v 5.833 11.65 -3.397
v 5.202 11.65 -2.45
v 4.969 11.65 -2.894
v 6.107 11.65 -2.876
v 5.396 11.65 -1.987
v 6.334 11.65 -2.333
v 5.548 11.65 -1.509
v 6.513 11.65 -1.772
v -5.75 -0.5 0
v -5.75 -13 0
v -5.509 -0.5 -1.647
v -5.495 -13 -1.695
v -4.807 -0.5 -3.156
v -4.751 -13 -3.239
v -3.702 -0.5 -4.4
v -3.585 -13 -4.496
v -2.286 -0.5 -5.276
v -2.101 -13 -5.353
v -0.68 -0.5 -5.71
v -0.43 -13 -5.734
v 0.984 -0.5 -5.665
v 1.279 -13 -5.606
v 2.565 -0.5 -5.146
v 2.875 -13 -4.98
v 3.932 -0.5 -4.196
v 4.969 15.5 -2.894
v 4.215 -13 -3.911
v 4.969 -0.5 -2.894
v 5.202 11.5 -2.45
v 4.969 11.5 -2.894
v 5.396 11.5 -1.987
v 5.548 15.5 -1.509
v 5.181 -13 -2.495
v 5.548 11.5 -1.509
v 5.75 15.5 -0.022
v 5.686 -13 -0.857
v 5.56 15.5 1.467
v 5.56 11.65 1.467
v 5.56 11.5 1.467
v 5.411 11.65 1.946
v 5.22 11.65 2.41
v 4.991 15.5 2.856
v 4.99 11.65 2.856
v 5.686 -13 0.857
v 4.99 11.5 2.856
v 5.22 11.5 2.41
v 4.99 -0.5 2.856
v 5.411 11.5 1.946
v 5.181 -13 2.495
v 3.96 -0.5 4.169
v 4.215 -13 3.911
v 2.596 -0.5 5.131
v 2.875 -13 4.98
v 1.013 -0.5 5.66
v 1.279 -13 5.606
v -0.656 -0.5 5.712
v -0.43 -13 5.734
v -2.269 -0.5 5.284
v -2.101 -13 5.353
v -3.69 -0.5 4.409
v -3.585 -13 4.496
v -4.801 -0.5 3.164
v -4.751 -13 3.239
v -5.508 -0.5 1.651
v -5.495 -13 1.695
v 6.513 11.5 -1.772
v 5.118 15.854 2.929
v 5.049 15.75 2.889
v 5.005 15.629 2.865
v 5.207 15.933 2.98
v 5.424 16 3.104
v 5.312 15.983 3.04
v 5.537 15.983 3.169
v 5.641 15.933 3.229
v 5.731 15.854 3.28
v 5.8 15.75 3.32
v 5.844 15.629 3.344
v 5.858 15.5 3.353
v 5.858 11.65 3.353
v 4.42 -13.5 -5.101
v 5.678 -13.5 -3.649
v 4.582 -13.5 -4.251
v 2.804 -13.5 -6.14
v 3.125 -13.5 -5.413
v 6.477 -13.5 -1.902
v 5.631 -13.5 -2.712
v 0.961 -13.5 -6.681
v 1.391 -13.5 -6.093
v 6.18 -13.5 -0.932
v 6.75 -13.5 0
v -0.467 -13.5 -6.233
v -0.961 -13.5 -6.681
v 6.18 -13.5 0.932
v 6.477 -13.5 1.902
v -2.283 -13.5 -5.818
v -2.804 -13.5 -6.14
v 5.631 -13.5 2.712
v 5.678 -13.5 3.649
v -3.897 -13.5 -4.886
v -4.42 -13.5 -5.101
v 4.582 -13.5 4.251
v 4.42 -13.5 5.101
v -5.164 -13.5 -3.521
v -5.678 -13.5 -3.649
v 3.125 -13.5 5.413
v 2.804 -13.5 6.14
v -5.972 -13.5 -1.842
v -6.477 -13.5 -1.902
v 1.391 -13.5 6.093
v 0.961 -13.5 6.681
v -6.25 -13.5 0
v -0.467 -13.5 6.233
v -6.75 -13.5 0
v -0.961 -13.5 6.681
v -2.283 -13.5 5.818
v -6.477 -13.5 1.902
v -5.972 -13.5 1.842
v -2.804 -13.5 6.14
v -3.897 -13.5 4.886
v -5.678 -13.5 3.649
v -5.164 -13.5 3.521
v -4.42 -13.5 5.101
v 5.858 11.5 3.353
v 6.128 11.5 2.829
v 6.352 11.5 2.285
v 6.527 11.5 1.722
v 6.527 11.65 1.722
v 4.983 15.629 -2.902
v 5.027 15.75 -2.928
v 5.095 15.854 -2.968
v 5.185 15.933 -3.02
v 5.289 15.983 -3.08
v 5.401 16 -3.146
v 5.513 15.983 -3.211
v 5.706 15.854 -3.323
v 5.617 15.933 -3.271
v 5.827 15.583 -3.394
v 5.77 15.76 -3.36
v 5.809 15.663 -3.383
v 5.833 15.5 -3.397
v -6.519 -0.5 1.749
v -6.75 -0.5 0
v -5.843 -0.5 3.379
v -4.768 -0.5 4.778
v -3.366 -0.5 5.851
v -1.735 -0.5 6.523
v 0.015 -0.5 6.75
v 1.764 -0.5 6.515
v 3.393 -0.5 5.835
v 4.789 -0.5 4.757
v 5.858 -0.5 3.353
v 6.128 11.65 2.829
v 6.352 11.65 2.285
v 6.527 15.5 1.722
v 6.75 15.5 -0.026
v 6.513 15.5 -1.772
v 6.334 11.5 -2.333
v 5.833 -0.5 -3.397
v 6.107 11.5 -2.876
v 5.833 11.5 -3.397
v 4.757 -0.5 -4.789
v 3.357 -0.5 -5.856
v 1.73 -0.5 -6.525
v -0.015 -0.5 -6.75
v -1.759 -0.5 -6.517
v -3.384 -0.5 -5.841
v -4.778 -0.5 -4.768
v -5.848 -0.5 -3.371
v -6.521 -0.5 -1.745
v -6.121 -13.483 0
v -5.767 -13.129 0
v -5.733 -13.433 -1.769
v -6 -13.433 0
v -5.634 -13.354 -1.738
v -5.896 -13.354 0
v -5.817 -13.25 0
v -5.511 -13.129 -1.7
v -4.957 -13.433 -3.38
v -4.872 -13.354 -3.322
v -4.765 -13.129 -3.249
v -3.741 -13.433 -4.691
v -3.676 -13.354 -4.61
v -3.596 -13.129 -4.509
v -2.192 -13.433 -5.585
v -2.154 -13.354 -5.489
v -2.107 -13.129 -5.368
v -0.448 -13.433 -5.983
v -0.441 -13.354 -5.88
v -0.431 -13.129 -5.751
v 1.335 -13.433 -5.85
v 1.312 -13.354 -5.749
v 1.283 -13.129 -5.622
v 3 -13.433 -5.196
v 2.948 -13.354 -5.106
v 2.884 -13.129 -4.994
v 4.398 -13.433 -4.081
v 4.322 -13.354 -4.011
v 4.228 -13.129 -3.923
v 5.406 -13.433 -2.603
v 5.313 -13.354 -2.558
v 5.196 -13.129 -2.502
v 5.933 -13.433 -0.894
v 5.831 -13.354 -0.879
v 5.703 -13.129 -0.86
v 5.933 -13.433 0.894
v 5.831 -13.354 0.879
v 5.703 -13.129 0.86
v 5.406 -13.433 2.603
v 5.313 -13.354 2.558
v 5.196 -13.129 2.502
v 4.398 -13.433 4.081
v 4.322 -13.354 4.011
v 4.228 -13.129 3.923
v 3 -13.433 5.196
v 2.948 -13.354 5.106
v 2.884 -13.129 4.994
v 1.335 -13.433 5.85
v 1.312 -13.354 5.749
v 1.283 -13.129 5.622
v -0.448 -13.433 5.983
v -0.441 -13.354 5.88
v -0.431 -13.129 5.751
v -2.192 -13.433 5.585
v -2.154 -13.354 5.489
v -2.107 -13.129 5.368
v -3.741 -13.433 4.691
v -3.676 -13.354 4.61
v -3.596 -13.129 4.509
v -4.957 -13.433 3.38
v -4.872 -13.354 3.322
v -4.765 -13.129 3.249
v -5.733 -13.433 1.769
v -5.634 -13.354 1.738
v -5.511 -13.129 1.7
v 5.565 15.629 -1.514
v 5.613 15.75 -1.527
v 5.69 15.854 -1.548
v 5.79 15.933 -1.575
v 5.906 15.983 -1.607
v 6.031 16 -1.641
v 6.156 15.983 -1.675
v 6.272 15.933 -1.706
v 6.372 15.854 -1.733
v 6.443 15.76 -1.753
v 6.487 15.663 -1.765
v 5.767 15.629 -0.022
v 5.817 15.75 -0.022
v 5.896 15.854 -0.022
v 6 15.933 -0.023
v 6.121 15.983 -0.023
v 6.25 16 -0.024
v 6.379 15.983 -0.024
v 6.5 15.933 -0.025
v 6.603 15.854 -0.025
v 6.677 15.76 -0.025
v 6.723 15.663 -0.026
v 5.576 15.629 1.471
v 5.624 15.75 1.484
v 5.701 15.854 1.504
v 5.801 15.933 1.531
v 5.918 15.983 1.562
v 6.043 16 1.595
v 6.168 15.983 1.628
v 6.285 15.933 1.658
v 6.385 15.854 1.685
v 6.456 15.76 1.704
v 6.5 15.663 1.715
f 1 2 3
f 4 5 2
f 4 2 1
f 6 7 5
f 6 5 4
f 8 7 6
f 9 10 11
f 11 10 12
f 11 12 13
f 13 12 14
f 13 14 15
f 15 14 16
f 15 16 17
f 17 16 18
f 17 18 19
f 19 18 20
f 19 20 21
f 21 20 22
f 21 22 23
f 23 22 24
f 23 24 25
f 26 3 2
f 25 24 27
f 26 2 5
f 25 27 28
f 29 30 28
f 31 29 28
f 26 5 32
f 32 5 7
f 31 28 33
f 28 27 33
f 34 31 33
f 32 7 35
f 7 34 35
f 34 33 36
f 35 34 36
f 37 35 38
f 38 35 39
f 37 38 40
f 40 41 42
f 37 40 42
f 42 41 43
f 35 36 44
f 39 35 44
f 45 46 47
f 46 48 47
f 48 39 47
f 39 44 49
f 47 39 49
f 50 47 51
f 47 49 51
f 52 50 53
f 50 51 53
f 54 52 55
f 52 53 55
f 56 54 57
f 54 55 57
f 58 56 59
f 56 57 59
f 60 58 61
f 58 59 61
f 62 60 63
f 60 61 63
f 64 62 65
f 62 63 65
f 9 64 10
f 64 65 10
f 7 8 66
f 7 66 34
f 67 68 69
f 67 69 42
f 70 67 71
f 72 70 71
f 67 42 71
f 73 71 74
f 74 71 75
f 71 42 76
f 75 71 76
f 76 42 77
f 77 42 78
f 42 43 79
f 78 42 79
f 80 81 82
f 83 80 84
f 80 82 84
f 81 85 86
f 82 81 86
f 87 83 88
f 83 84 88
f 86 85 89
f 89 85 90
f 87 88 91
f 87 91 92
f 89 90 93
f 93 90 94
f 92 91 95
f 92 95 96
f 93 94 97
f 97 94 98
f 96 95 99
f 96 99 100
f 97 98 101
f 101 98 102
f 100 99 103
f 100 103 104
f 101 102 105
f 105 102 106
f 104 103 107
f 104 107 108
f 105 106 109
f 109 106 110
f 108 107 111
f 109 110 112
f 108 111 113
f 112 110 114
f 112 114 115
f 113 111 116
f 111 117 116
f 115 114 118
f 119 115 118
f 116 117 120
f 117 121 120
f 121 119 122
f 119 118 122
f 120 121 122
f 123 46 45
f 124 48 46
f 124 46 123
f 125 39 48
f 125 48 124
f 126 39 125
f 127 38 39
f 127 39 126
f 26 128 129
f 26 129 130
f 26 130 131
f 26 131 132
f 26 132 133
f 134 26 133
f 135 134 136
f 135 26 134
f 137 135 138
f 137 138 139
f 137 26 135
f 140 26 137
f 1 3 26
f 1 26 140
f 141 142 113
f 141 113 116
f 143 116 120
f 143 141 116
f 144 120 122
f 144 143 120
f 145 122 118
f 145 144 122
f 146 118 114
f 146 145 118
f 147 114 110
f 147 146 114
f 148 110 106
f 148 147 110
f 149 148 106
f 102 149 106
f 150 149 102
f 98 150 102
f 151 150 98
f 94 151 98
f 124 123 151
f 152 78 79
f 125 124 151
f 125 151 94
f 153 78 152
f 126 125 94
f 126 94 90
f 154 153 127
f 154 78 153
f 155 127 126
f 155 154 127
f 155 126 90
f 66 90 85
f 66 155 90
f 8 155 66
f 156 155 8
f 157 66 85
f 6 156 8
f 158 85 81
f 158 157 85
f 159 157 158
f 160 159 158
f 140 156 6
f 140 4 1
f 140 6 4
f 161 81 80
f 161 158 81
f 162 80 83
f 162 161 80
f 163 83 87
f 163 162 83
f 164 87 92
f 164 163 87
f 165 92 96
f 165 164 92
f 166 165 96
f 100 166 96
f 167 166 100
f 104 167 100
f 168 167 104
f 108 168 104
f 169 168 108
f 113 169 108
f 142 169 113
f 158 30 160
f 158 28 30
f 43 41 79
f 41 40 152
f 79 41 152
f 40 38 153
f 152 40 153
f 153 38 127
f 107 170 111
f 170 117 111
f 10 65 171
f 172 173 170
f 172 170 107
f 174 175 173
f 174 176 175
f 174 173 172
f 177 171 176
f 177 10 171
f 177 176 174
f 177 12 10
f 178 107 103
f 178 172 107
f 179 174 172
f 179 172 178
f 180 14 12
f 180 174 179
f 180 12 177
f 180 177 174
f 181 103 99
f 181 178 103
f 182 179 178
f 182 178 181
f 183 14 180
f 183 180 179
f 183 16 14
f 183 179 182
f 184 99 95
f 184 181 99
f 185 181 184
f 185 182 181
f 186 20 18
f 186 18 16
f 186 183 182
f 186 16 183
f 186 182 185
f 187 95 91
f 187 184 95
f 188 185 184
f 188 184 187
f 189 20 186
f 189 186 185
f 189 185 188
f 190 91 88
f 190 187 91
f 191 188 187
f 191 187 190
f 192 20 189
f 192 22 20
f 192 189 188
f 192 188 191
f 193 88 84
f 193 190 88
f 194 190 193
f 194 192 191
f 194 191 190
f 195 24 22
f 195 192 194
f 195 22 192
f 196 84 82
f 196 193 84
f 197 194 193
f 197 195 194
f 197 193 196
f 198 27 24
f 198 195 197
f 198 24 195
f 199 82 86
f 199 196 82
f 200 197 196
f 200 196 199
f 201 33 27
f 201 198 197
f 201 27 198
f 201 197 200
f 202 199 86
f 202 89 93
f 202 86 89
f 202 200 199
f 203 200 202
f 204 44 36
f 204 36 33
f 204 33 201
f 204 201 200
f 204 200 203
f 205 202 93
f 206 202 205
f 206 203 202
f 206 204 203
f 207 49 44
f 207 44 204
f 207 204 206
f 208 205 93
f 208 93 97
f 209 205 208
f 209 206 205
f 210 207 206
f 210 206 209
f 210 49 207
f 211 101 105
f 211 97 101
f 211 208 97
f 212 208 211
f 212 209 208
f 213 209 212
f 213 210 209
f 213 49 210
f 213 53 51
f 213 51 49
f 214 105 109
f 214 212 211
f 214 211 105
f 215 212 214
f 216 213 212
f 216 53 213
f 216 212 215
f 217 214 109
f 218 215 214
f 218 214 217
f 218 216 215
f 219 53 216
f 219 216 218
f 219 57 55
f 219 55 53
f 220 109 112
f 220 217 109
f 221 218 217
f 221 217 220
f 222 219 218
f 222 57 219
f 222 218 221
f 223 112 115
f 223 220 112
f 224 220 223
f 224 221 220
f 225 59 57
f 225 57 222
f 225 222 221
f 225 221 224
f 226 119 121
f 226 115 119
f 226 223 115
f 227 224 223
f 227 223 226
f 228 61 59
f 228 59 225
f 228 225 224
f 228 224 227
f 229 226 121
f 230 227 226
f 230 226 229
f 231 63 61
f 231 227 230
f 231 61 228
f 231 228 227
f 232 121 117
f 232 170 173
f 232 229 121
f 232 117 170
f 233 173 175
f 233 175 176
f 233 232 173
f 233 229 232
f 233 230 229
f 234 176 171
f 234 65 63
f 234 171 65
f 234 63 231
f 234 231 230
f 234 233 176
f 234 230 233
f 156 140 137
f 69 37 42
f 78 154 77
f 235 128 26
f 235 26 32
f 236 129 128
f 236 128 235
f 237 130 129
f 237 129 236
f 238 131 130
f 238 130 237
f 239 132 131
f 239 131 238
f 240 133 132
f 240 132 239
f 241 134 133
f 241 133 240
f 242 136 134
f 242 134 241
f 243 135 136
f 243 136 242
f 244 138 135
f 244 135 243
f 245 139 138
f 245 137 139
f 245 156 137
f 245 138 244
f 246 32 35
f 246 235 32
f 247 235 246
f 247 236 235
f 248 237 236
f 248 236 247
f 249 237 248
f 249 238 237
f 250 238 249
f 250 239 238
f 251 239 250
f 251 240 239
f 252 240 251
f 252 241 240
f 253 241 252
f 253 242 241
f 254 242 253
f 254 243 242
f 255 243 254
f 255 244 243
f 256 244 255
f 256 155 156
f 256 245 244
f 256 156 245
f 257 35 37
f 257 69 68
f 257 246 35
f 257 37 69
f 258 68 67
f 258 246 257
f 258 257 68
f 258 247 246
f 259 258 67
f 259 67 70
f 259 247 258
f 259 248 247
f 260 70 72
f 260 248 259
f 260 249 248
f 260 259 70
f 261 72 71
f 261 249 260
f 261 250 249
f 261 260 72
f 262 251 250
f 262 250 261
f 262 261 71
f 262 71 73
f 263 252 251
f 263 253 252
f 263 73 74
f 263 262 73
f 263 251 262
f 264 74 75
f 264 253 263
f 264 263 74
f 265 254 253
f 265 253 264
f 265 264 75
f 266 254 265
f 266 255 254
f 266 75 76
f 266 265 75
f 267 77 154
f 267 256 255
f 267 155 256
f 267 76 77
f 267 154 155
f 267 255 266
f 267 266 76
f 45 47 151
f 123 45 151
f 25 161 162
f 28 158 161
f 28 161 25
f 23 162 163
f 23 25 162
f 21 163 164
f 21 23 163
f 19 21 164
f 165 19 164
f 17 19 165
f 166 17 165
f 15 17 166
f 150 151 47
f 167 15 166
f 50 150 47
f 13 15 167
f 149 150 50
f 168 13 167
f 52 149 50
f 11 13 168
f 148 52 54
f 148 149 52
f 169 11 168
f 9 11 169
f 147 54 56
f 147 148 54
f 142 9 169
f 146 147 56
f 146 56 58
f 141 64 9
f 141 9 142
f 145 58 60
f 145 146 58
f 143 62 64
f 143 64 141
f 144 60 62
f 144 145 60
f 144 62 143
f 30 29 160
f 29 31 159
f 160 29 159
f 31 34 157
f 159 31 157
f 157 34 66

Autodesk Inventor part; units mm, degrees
sketch "Sketch1" plane through (0, 0, 0) normal (0, 0, 1) x (1, 0, 0)
  line L0 (-6.25, -13.5) -> (-6.75, -13.5)
  line L1 (-6.75, -13.5) -> (-6.75, 15.5)
  line L2 (-6.25, 16) -> (-6.25, 16)
  line L3 (-5.75, 15.5) -> (-5.75, -13)
  arc A0 (-6.25, -13.5) -> (-5.75, -13) centre (-6.25, -13) ccw
  arc A1 (-6.25, 16) -> (-6.75, 15.5) centre (-6.25, 15.5) ccw
  arc A2 (-5.75, 15.5) -> (-6.25, 16) centre (-6.25, 15.5) ccw
  line L4 (0, -19.545) -> (0, 22.045) projected
  point P0 (-5.75, -13.5)
  point P1 (-6.75, 16)
  point P2 (0, 0)
  dimension "d2" = 29.5
  dimension "d3" = 1
  dimension "d4" = 5.75
  dimension "d5" = 13.5
  dimension "d6" = 0.5
revolve "Revolution1" add sketch "Sketch1" angle 360 about axis through (0, -10, 0) along (0, 1, 0)
ref_plane "Work Plane1" through (0, 15.5, 0) normal (0, 1, 0) x (-1, 0, 0)
sketch "Sketch3" plane through (0, 15.5, 0) normal (0, 1, 0) x (-1, 0, 0)
  circle A0 centre (0, 0) radius 6.75 construction
  circle A1 centre (0, 0) radius 5.75 construction
  arc A2 (-5.8328, -3.3972) -> (-5.8584, 3.3528) centre (0, 0) ccw
  arc A3 (-4.9687, -2.8939) -> (-4.9905, 2.8561) centre (0, 0) ccw
  line L0 (-0.0608, 0.0348) -> (-0.0605, -0.0352)
  line L1 (0, 0) -> (-0.0608, 0.0348)
  line L2 (-4.9905, 2.8561) -> (-5.8584, 3.3528)
  line L3 (0, 0) -> (-0.0605, -0.0352)
  line L4 (-4.9687, -2.8939) -> (-5.8328, -3.3972)
  point P0 (-0.0584, 6.7497)
  point P1 (-0.0071, -6.75)
  point P2 (-0.0546, 5.7497)
  point P3 (-0.0085, -5.75)
  dimension "d22" = 60
ref_plane "Work Plane3" through (5.8328, -0.5, -3.3972) normal (-0.5032861, 0, -0.8641199) x (-0.8641199, 0, 0.5032861)
sketch "Sketch4" plane through (5.8328, -0.5, -3.3972) normal (-0.5032861, 0, -0.8641199) x (-0.8641199, 0, 0.5032861)
  arc A0 (1, 16) -> (0, 16) centre (0.5, 16) ccw construction
  line L0 (0, 0) -> (0, 16) construction
  line L1 (1, 16) -> (1, 0) construction
  line L2 (0, 12.15) -> (1, 12.15)
  line L3 (1, 12.15) -> (1, 12)
  line L4 (1, 12) -> (0, 12)
  line L5 (0, 12) -> (0, 12.15)
  line L6 (6.75, -18.9) -> (6.75, 22.4) projected
  point P0 (6.75, 0.5)
  dimension "d14" = 1
  dimension "d15" = 0.15
  dimension "d16" = 4.5
revolve "Revolution2" cut sketch "Sketch4" angle 15 about axis through (0, -10, 0) along (0, -1, 0)
ref_plane "Work Plane2" through (4.9905, -0.5, 2.8561) normal (-0.4967067, 0, 0.8679184) x (0.8679184, 0, 0.4967067)
sketch "Sketch5" plane through (4.9905, -0.5, 2.8561) normal (-0.4967067, 0, 0.8679184) x (0.8679184, 0, 0.4967067)
  arc A0 (1, 16) -> (0, 16) centre (0.5, 16) ccw construction
  line L0 (0, 0) -> (0, 16) construction
  line L1 (1, 16) -> (1, 0) construction
  line L2 (0, 12.15) -> (1, 12.15)
  line L3 (1, 12.15) -> (1, 12)
  line L4 (1, 12) -> (0, 12)
  line L5 (0, 12) -> (0, 12.15)
  line L6 (6.75, -18.9) -> (6.75, 22.4)
  line L7 (-5.75, -27.16) -> (-5.75, 30.66) projected
  point P0 (-5.75, 0.5)
  point P1 (6.75, 0.5)
  dimension "d18" = 1
  dimension "d19" = 0.15
  dimension "d20" = 4.5
revolve "Revolution3" cut sketch "Sketch5" angle 15 about axis through (0, -10, 0) along (0, 1, 0)
extrude "Extrusion2" cut sketch "Sketch3" along normal blind 0.5 and the other way blind 16 contours L4 A3 L2 A2
properties part number "ConnectorSocket"
